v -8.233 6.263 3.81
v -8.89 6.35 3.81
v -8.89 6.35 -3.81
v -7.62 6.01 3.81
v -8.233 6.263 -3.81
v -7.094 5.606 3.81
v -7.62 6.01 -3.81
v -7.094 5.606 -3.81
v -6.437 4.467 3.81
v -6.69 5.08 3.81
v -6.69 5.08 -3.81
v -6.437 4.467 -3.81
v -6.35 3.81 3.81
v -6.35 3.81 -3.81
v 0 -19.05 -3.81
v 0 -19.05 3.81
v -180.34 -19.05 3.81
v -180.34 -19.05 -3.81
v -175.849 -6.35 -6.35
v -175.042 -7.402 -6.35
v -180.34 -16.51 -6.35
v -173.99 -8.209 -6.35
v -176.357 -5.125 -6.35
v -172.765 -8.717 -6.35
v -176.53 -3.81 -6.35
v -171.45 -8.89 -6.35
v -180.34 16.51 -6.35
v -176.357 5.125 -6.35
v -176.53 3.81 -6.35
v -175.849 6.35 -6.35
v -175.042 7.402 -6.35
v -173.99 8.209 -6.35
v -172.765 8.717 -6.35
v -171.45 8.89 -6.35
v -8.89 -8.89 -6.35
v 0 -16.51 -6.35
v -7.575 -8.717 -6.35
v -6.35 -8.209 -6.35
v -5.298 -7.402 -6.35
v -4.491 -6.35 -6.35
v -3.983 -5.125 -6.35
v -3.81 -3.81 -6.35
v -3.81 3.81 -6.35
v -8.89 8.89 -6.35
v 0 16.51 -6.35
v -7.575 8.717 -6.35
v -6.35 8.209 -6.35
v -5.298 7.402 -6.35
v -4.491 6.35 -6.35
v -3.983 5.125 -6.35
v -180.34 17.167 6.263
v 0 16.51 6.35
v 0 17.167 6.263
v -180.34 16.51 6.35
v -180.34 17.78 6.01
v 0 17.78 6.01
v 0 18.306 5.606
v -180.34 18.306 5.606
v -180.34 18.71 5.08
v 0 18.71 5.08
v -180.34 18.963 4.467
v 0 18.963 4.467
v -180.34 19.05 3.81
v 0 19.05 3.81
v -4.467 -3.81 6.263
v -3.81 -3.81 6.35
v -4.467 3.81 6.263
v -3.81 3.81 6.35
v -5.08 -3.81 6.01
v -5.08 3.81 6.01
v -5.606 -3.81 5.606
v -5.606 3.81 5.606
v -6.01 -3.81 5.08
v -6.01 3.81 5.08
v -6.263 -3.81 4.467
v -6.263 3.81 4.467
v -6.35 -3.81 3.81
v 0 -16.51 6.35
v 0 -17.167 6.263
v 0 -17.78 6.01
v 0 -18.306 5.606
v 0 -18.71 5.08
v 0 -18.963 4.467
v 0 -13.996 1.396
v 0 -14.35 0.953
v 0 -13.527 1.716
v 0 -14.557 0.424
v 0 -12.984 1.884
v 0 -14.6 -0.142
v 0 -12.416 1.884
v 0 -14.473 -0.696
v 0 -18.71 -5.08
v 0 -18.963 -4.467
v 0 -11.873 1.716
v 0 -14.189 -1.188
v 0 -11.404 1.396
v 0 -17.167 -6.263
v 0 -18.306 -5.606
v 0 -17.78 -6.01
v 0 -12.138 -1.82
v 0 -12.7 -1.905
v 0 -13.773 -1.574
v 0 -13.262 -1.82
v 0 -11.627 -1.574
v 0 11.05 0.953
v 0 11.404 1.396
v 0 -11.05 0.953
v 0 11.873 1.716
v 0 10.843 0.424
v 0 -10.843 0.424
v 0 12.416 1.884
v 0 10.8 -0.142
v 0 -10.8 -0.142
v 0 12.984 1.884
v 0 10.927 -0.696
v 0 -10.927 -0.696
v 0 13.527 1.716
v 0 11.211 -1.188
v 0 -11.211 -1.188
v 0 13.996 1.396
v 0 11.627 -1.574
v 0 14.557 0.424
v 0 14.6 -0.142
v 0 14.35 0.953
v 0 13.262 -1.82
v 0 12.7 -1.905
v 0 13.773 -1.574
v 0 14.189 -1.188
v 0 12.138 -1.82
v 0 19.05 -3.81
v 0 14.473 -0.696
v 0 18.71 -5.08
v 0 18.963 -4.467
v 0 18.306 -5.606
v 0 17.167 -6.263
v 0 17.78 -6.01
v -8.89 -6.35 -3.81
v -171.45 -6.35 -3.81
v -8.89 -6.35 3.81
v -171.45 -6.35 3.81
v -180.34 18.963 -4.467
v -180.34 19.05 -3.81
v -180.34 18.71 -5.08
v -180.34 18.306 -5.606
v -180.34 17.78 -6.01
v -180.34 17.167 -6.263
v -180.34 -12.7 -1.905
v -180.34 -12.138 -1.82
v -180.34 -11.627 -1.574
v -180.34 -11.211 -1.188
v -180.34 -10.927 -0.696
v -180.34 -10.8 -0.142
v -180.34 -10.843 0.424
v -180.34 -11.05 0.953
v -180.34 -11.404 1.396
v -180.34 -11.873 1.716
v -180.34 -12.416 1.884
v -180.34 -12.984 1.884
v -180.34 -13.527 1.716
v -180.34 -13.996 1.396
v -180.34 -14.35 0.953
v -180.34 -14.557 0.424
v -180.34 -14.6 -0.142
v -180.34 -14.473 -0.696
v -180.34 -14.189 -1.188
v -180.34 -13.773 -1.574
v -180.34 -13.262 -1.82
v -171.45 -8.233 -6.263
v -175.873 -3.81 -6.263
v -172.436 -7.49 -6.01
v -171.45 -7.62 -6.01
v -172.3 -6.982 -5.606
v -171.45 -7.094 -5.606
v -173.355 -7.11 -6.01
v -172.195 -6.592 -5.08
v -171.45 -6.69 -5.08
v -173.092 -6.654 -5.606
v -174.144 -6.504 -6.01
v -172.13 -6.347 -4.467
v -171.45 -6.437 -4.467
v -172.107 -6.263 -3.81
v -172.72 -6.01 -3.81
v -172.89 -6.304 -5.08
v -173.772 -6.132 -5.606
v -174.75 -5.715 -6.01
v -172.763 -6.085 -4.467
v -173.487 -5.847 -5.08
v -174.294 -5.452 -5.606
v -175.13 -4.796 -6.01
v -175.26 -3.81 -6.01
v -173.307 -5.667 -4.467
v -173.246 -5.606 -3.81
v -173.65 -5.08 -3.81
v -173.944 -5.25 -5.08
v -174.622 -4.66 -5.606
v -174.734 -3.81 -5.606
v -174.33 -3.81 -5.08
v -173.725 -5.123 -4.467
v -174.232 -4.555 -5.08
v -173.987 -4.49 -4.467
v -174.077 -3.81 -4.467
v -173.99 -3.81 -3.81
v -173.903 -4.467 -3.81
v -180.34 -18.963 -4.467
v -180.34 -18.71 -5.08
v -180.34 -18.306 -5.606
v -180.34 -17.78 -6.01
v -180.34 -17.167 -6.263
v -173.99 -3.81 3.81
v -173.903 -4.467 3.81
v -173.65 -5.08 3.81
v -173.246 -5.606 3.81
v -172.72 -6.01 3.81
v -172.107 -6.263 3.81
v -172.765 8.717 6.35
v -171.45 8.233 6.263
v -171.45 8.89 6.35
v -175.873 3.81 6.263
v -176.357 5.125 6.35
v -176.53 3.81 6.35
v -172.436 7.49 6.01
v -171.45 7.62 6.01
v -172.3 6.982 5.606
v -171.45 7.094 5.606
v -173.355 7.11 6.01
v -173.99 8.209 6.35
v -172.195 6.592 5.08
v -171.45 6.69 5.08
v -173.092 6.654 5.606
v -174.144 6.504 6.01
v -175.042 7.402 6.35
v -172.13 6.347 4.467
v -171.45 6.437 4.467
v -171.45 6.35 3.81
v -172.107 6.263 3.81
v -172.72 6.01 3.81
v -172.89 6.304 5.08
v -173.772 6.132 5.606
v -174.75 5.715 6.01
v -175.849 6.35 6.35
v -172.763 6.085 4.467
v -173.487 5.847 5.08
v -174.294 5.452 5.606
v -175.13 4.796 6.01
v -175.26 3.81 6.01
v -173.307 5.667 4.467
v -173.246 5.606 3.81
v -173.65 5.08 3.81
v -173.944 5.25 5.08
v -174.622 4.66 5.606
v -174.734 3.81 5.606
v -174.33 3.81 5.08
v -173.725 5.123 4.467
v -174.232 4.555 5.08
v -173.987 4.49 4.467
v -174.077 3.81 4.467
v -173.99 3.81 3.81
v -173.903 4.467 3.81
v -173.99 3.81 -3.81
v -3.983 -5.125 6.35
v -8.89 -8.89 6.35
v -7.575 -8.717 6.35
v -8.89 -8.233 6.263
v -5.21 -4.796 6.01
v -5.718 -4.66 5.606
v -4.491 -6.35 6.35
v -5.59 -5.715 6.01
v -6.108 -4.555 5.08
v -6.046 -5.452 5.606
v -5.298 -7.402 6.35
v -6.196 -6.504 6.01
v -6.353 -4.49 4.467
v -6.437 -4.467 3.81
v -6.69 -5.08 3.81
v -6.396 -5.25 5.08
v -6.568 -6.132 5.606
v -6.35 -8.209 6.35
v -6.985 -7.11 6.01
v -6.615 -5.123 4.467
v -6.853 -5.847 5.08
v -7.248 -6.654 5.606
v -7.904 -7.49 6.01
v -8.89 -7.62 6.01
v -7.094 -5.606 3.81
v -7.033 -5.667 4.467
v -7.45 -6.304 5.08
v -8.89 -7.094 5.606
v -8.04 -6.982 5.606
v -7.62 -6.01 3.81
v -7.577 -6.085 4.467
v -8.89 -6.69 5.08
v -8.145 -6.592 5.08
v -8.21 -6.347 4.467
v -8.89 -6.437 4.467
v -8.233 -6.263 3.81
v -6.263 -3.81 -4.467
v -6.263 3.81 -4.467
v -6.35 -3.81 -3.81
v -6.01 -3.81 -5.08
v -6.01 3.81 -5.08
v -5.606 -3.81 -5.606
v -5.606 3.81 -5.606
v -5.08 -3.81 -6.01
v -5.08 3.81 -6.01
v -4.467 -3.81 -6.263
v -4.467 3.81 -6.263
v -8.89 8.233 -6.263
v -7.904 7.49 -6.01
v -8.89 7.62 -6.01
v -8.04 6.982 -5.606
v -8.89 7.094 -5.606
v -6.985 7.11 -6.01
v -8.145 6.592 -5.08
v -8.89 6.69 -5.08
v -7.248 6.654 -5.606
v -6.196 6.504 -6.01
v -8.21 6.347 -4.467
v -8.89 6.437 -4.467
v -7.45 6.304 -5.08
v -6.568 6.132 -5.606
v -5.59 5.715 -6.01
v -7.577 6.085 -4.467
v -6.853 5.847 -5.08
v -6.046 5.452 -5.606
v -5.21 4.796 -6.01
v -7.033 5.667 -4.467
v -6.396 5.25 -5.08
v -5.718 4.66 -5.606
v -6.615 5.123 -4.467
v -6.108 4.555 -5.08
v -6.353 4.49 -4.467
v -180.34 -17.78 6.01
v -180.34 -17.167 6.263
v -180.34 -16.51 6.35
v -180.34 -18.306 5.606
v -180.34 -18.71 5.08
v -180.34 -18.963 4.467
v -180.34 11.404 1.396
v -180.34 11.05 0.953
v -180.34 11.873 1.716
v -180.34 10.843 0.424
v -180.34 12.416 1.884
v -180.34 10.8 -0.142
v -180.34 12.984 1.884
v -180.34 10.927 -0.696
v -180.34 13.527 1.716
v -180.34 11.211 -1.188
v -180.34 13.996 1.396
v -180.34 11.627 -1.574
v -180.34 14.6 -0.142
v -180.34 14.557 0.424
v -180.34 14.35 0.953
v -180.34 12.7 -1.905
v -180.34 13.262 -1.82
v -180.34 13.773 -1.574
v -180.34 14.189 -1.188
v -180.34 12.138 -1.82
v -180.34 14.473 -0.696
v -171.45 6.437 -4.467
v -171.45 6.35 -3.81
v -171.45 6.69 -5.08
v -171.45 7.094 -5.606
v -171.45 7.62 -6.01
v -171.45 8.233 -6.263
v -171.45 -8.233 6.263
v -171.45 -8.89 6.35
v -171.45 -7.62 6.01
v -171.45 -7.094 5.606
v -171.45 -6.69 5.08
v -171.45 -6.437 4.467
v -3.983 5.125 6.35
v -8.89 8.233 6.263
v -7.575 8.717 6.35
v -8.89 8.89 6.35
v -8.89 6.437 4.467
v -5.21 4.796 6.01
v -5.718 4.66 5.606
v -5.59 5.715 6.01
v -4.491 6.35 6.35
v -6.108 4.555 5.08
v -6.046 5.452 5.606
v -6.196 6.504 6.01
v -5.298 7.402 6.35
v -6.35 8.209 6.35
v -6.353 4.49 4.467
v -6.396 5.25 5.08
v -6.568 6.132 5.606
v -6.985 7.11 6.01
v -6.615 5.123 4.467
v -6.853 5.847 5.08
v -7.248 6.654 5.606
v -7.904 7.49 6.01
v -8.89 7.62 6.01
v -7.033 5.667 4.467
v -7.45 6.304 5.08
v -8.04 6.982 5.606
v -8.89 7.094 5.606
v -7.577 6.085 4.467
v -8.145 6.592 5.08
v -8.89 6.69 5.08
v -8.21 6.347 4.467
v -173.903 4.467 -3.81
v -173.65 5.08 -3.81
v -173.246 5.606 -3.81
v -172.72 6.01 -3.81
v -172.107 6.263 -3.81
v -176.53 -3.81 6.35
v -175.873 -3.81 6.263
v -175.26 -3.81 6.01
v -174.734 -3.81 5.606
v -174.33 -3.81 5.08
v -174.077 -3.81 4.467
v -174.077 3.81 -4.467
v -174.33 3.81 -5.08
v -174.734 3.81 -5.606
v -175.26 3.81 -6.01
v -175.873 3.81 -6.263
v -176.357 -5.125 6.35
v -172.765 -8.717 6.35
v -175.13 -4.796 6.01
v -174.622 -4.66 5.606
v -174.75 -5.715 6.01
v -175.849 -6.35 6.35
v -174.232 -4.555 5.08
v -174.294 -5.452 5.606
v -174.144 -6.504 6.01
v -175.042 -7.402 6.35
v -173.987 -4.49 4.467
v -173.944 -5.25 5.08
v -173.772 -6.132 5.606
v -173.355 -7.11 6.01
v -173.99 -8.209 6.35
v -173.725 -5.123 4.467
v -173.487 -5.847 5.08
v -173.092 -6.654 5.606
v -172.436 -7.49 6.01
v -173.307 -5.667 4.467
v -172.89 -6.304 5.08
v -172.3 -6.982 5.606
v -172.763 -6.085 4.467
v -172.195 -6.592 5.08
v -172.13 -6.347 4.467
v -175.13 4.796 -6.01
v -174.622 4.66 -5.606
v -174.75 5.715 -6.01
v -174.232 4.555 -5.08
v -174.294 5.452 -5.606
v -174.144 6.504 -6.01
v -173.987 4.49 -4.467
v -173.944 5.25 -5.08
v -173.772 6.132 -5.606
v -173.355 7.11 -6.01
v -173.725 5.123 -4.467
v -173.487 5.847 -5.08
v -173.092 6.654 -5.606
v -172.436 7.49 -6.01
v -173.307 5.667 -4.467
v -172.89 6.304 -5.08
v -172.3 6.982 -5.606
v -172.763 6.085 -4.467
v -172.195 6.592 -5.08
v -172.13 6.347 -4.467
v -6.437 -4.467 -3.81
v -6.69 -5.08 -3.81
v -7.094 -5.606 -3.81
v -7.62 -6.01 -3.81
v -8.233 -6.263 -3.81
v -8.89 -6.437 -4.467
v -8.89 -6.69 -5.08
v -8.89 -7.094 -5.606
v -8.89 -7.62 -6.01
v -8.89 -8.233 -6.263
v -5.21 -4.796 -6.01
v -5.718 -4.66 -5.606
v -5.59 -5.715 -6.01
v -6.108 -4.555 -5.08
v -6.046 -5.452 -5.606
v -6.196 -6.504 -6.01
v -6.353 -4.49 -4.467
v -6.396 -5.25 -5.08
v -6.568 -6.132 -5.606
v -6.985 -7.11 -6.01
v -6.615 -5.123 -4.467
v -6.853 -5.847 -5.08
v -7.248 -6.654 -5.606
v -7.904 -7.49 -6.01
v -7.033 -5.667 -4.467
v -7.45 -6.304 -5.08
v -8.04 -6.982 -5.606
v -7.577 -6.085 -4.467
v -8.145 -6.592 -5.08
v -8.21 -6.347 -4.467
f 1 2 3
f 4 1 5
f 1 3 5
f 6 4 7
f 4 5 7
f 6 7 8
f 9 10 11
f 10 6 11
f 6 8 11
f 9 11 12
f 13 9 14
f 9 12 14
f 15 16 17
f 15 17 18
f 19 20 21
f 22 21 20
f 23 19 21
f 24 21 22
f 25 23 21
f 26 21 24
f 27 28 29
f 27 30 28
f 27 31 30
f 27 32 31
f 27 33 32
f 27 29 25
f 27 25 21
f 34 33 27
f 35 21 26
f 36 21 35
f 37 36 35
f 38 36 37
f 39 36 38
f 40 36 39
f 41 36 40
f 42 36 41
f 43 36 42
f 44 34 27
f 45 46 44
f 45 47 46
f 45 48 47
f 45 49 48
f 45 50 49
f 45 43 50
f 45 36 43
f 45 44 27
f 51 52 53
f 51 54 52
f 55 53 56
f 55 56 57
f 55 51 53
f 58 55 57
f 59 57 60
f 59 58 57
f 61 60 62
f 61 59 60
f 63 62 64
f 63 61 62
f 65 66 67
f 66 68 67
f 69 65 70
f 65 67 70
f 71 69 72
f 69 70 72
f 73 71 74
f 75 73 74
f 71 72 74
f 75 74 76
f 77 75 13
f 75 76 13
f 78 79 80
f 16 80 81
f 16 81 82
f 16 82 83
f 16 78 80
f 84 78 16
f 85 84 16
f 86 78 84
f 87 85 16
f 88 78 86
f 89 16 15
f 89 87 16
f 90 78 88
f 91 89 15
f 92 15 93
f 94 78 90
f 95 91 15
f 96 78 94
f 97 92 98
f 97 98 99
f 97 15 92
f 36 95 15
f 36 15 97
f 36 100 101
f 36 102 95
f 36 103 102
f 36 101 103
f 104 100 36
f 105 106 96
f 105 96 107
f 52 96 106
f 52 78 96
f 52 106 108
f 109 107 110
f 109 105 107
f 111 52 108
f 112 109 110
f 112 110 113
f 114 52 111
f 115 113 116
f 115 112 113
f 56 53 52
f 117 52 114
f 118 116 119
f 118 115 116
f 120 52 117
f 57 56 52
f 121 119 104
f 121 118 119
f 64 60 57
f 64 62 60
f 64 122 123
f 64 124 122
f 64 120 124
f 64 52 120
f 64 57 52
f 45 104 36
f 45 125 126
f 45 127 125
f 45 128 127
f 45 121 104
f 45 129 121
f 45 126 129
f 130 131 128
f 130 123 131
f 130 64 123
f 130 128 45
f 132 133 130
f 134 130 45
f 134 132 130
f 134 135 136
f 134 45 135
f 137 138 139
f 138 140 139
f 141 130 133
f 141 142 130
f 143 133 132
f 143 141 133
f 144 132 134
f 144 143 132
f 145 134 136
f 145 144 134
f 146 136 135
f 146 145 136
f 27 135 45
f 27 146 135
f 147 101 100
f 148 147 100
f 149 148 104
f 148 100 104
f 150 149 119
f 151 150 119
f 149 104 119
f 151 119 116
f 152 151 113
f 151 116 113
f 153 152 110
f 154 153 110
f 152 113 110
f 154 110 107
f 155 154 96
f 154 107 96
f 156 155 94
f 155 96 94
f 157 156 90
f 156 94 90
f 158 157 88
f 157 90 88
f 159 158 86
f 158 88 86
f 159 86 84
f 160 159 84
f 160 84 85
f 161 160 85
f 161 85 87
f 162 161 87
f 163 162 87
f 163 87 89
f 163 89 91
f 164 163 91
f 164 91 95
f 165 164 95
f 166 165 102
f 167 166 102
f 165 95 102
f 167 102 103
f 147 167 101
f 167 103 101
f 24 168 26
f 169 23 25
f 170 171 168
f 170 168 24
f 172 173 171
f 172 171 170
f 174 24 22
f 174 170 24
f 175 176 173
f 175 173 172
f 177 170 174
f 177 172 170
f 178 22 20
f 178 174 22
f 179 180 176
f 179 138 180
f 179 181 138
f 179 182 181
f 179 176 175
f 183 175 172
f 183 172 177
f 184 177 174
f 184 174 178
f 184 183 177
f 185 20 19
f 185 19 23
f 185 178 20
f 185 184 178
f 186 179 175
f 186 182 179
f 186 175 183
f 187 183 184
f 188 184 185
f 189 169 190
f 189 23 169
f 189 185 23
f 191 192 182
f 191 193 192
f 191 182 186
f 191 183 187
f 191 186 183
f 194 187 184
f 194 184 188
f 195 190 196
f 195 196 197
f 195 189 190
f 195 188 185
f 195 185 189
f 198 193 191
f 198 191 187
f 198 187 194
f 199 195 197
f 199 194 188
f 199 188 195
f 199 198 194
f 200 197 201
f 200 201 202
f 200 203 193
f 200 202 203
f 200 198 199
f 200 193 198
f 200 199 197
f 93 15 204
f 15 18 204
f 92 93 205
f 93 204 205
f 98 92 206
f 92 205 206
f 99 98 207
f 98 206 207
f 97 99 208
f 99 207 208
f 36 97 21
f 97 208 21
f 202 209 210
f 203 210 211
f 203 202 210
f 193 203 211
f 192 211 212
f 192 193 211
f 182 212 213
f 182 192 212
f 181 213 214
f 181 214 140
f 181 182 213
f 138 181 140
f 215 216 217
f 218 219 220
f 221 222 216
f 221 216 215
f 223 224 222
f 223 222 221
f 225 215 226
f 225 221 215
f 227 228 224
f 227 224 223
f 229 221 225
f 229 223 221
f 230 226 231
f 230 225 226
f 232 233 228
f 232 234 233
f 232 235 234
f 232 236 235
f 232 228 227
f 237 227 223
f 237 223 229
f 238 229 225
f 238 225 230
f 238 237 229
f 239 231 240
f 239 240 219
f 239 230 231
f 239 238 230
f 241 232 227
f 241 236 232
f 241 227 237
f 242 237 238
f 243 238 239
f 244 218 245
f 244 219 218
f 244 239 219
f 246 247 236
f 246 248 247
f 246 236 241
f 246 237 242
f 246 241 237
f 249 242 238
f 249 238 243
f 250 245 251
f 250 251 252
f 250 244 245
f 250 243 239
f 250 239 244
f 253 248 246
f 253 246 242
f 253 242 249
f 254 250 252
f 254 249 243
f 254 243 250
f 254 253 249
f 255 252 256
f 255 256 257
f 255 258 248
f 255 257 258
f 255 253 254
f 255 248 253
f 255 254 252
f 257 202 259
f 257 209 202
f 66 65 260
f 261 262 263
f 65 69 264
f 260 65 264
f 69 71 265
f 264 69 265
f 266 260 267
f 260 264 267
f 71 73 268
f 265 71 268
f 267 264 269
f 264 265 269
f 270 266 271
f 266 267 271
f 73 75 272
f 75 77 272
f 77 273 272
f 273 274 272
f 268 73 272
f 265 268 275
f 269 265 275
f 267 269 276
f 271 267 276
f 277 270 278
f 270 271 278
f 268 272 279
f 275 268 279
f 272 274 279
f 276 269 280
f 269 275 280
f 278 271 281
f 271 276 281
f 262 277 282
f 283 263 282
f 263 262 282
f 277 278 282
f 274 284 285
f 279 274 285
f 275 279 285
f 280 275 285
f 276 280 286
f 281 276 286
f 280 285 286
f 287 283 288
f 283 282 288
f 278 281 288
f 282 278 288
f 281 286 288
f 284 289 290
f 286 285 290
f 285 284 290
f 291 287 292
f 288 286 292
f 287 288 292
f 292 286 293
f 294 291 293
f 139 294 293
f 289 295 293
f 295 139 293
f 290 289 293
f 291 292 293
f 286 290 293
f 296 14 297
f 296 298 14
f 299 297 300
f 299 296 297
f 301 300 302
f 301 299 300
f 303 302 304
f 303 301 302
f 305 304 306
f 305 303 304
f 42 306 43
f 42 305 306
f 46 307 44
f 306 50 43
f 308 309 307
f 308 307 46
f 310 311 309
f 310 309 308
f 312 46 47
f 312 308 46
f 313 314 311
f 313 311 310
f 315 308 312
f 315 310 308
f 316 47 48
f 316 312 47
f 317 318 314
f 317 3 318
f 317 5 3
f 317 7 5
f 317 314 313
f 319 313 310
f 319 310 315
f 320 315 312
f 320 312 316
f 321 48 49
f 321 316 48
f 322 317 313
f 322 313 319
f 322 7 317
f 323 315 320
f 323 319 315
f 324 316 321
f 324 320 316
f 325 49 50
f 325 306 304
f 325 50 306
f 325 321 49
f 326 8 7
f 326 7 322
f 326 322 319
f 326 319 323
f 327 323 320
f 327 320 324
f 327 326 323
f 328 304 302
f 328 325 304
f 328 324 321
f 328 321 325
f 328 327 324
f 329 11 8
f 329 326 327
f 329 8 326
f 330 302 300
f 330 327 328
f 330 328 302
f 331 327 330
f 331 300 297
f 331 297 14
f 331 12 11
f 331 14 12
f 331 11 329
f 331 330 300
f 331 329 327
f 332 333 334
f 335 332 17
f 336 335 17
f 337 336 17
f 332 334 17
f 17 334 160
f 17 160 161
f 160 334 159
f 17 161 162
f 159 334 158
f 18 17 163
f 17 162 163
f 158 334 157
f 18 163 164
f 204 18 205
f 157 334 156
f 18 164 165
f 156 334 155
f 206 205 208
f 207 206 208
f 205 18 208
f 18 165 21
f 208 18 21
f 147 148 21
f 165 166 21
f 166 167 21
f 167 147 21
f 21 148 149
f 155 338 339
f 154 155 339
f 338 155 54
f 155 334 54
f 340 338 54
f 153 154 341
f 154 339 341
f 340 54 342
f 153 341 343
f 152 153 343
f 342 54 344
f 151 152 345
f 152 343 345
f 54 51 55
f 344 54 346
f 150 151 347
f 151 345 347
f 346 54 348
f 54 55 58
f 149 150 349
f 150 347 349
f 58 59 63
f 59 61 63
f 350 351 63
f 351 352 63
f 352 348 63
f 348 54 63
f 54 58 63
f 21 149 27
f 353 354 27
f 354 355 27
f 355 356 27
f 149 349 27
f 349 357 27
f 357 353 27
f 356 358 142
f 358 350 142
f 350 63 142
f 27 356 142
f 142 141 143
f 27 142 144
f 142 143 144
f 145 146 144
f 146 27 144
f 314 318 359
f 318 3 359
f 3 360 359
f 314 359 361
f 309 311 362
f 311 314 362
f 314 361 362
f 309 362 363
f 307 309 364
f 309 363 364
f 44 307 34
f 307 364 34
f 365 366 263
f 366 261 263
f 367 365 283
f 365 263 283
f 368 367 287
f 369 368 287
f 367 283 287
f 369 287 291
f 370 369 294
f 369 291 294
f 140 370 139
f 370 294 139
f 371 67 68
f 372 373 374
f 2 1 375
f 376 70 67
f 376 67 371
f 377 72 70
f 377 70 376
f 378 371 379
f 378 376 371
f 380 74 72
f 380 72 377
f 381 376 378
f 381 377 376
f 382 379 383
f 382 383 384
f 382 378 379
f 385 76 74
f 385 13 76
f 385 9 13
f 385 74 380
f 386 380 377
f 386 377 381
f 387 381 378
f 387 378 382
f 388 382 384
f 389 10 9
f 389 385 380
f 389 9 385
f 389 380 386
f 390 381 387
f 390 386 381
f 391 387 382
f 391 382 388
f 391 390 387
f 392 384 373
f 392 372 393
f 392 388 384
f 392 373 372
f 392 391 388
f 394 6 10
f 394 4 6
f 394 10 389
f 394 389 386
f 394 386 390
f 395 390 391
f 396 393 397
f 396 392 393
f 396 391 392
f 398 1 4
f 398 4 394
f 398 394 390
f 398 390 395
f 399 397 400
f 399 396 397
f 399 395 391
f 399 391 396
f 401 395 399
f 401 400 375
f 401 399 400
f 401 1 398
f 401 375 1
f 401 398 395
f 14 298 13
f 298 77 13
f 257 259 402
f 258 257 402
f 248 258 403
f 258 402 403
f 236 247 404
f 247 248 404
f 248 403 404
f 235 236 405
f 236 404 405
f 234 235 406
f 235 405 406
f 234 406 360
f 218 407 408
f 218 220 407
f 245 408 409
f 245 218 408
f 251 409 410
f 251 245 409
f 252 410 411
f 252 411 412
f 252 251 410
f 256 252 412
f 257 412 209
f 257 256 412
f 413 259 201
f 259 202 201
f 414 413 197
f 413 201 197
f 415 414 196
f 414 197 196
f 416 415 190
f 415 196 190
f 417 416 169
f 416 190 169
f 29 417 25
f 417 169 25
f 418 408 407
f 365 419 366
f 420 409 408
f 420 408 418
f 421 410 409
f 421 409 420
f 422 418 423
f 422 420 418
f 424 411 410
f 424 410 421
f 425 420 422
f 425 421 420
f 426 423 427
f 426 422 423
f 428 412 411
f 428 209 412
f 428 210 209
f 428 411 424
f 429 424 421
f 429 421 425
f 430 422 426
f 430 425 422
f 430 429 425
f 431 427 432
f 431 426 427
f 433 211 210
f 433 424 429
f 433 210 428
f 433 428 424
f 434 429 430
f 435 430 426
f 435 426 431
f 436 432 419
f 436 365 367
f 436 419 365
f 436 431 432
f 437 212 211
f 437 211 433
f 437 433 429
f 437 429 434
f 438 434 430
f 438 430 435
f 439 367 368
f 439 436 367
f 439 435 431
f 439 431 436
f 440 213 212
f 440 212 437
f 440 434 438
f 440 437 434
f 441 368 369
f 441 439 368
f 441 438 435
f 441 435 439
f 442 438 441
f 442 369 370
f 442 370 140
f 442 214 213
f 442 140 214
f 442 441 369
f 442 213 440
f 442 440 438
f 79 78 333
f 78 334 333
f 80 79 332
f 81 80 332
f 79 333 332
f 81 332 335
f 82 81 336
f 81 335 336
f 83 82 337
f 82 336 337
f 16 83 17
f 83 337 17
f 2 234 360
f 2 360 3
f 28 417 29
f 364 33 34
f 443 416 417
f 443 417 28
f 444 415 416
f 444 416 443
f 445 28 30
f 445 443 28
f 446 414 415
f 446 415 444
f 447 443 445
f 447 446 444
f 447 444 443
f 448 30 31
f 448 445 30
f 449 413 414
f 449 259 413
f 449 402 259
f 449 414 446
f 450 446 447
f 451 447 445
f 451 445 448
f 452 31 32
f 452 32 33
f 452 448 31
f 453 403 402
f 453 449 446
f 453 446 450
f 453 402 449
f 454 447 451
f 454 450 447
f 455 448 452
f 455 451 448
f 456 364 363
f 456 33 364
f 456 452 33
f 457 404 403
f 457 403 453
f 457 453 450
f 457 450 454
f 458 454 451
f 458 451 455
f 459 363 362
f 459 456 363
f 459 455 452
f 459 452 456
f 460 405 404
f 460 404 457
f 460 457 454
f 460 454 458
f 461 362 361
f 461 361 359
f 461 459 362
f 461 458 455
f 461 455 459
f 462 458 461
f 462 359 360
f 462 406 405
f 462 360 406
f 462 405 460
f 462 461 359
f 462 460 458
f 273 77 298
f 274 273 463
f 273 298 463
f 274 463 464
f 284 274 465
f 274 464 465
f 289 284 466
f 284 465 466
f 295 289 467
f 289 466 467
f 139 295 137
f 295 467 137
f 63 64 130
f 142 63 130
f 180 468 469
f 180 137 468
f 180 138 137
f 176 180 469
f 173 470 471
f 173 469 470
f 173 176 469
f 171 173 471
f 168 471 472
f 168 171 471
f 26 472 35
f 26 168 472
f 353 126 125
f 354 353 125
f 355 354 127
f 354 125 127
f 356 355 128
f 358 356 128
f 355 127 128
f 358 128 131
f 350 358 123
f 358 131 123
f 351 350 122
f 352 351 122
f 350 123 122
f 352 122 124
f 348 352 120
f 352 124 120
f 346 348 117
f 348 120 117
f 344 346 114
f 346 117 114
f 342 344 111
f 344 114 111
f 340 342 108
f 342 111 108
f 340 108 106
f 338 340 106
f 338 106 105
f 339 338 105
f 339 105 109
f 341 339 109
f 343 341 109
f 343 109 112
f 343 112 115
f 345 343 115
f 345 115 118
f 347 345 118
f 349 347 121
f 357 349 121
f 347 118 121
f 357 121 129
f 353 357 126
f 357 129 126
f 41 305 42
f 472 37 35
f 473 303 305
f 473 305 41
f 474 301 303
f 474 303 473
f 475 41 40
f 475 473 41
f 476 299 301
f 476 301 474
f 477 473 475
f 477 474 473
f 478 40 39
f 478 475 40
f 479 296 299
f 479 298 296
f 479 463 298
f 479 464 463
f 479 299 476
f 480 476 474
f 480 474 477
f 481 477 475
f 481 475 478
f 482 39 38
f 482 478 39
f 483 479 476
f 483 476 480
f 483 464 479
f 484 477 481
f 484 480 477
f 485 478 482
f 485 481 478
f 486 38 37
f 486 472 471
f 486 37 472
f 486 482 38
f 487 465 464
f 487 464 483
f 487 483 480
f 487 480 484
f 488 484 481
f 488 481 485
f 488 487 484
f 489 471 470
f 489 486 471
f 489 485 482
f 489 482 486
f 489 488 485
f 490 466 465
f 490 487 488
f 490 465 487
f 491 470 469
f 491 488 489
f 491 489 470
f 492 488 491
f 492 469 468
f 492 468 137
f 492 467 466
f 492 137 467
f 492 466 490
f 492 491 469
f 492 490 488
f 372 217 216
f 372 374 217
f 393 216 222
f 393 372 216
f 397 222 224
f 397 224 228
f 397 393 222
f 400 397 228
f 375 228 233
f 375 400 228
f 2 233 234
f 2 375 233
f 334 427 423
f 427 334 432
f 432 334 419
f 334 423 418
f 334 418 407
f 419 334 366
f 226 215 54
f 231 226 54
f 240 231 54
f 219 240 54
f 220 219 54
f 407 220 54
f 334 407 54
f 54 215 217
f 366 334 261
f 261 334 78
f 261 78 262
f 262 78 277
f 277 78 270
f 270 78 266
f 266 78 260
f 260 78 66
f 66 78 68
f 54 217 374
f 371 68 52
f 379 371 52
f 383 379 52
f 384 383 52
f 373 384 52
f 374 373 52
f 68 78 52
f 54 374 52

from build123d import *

# Parameters (mm, degrees)
SKETCH1_W           = 12.7
SKETCH1_H           = 38.1
SKETCH1_R           = 1.905
BOSS_EXTRUDE1_DEPTH = 180.34
SKETCH3_W           = 167.64
SKETCH3_H           = 12.7
CUT_EXTRUDE1_DEPTH  = 182.787535601
FILLET1_R           = 2.54


with BuildPart() as part:
    # Sketch1 → Boss-Extrude1 (new body)
    with BuildSketch(Plane(origin=(0, 0, 0), x_dir=(0, 0, -1), z_dir=(1, 0, 0))):
        Rectangle(SKETCH1_W, SKETCH1_H)
        with Locations((0, -12.7)):
            Circle(SKETCH1_R, mode=Mode.SUBTRACT)
        with Locations((0, 12.7)):
            Circle(SKETCH1_R, mode=Mode.SUBTRACT)
    extrude(amount=-BOSS_EXTRUDE1_DEPTH)

    # Sketch3 → Cut-Extrude1 (cut, through all)
    with BuildSketch(Plane.XY.offset(6.35)):
        with Locations((-90.17, 0)):
            Rectangle(SKETCH3_W, SKETCH3_H)
    extrude(amount=-CUT_EXTRUDE1_DEPTH, mode=Mode.SUBTRACT)

    # Fillet1
    fillet1_edges = [part.edges().sort_by_distance(p)[0] for p in [
        (-6.35, 0, -6.35),
        (-6.35, 6.35, 0),
        (-90.17, -6.35, -6.35),
        (-6.35, -6.35, 0),
        (-173.99, 0, -6.35),
        (-173.99, -6.35, 0),
        (-90.17, 6.35, -6.35),
        (-173.99, 6.35, 0),
        (-6.35, 0, 6.35),
        (-90.17, 6.35, 6.35),
        (-173.99, 0, 6.35),
        (-90.17, -6.35, 6.35),
        (-90.17, 19.05, 6.35),
        (-90.17, 19.05, -6.35),
        (-90.17, -19.05, -6.35),
        (-90.17, -19.05, 6.35),
    ]]
    fillet(fillet1_edges, radius=FILLET1_R)


solid = part.part
